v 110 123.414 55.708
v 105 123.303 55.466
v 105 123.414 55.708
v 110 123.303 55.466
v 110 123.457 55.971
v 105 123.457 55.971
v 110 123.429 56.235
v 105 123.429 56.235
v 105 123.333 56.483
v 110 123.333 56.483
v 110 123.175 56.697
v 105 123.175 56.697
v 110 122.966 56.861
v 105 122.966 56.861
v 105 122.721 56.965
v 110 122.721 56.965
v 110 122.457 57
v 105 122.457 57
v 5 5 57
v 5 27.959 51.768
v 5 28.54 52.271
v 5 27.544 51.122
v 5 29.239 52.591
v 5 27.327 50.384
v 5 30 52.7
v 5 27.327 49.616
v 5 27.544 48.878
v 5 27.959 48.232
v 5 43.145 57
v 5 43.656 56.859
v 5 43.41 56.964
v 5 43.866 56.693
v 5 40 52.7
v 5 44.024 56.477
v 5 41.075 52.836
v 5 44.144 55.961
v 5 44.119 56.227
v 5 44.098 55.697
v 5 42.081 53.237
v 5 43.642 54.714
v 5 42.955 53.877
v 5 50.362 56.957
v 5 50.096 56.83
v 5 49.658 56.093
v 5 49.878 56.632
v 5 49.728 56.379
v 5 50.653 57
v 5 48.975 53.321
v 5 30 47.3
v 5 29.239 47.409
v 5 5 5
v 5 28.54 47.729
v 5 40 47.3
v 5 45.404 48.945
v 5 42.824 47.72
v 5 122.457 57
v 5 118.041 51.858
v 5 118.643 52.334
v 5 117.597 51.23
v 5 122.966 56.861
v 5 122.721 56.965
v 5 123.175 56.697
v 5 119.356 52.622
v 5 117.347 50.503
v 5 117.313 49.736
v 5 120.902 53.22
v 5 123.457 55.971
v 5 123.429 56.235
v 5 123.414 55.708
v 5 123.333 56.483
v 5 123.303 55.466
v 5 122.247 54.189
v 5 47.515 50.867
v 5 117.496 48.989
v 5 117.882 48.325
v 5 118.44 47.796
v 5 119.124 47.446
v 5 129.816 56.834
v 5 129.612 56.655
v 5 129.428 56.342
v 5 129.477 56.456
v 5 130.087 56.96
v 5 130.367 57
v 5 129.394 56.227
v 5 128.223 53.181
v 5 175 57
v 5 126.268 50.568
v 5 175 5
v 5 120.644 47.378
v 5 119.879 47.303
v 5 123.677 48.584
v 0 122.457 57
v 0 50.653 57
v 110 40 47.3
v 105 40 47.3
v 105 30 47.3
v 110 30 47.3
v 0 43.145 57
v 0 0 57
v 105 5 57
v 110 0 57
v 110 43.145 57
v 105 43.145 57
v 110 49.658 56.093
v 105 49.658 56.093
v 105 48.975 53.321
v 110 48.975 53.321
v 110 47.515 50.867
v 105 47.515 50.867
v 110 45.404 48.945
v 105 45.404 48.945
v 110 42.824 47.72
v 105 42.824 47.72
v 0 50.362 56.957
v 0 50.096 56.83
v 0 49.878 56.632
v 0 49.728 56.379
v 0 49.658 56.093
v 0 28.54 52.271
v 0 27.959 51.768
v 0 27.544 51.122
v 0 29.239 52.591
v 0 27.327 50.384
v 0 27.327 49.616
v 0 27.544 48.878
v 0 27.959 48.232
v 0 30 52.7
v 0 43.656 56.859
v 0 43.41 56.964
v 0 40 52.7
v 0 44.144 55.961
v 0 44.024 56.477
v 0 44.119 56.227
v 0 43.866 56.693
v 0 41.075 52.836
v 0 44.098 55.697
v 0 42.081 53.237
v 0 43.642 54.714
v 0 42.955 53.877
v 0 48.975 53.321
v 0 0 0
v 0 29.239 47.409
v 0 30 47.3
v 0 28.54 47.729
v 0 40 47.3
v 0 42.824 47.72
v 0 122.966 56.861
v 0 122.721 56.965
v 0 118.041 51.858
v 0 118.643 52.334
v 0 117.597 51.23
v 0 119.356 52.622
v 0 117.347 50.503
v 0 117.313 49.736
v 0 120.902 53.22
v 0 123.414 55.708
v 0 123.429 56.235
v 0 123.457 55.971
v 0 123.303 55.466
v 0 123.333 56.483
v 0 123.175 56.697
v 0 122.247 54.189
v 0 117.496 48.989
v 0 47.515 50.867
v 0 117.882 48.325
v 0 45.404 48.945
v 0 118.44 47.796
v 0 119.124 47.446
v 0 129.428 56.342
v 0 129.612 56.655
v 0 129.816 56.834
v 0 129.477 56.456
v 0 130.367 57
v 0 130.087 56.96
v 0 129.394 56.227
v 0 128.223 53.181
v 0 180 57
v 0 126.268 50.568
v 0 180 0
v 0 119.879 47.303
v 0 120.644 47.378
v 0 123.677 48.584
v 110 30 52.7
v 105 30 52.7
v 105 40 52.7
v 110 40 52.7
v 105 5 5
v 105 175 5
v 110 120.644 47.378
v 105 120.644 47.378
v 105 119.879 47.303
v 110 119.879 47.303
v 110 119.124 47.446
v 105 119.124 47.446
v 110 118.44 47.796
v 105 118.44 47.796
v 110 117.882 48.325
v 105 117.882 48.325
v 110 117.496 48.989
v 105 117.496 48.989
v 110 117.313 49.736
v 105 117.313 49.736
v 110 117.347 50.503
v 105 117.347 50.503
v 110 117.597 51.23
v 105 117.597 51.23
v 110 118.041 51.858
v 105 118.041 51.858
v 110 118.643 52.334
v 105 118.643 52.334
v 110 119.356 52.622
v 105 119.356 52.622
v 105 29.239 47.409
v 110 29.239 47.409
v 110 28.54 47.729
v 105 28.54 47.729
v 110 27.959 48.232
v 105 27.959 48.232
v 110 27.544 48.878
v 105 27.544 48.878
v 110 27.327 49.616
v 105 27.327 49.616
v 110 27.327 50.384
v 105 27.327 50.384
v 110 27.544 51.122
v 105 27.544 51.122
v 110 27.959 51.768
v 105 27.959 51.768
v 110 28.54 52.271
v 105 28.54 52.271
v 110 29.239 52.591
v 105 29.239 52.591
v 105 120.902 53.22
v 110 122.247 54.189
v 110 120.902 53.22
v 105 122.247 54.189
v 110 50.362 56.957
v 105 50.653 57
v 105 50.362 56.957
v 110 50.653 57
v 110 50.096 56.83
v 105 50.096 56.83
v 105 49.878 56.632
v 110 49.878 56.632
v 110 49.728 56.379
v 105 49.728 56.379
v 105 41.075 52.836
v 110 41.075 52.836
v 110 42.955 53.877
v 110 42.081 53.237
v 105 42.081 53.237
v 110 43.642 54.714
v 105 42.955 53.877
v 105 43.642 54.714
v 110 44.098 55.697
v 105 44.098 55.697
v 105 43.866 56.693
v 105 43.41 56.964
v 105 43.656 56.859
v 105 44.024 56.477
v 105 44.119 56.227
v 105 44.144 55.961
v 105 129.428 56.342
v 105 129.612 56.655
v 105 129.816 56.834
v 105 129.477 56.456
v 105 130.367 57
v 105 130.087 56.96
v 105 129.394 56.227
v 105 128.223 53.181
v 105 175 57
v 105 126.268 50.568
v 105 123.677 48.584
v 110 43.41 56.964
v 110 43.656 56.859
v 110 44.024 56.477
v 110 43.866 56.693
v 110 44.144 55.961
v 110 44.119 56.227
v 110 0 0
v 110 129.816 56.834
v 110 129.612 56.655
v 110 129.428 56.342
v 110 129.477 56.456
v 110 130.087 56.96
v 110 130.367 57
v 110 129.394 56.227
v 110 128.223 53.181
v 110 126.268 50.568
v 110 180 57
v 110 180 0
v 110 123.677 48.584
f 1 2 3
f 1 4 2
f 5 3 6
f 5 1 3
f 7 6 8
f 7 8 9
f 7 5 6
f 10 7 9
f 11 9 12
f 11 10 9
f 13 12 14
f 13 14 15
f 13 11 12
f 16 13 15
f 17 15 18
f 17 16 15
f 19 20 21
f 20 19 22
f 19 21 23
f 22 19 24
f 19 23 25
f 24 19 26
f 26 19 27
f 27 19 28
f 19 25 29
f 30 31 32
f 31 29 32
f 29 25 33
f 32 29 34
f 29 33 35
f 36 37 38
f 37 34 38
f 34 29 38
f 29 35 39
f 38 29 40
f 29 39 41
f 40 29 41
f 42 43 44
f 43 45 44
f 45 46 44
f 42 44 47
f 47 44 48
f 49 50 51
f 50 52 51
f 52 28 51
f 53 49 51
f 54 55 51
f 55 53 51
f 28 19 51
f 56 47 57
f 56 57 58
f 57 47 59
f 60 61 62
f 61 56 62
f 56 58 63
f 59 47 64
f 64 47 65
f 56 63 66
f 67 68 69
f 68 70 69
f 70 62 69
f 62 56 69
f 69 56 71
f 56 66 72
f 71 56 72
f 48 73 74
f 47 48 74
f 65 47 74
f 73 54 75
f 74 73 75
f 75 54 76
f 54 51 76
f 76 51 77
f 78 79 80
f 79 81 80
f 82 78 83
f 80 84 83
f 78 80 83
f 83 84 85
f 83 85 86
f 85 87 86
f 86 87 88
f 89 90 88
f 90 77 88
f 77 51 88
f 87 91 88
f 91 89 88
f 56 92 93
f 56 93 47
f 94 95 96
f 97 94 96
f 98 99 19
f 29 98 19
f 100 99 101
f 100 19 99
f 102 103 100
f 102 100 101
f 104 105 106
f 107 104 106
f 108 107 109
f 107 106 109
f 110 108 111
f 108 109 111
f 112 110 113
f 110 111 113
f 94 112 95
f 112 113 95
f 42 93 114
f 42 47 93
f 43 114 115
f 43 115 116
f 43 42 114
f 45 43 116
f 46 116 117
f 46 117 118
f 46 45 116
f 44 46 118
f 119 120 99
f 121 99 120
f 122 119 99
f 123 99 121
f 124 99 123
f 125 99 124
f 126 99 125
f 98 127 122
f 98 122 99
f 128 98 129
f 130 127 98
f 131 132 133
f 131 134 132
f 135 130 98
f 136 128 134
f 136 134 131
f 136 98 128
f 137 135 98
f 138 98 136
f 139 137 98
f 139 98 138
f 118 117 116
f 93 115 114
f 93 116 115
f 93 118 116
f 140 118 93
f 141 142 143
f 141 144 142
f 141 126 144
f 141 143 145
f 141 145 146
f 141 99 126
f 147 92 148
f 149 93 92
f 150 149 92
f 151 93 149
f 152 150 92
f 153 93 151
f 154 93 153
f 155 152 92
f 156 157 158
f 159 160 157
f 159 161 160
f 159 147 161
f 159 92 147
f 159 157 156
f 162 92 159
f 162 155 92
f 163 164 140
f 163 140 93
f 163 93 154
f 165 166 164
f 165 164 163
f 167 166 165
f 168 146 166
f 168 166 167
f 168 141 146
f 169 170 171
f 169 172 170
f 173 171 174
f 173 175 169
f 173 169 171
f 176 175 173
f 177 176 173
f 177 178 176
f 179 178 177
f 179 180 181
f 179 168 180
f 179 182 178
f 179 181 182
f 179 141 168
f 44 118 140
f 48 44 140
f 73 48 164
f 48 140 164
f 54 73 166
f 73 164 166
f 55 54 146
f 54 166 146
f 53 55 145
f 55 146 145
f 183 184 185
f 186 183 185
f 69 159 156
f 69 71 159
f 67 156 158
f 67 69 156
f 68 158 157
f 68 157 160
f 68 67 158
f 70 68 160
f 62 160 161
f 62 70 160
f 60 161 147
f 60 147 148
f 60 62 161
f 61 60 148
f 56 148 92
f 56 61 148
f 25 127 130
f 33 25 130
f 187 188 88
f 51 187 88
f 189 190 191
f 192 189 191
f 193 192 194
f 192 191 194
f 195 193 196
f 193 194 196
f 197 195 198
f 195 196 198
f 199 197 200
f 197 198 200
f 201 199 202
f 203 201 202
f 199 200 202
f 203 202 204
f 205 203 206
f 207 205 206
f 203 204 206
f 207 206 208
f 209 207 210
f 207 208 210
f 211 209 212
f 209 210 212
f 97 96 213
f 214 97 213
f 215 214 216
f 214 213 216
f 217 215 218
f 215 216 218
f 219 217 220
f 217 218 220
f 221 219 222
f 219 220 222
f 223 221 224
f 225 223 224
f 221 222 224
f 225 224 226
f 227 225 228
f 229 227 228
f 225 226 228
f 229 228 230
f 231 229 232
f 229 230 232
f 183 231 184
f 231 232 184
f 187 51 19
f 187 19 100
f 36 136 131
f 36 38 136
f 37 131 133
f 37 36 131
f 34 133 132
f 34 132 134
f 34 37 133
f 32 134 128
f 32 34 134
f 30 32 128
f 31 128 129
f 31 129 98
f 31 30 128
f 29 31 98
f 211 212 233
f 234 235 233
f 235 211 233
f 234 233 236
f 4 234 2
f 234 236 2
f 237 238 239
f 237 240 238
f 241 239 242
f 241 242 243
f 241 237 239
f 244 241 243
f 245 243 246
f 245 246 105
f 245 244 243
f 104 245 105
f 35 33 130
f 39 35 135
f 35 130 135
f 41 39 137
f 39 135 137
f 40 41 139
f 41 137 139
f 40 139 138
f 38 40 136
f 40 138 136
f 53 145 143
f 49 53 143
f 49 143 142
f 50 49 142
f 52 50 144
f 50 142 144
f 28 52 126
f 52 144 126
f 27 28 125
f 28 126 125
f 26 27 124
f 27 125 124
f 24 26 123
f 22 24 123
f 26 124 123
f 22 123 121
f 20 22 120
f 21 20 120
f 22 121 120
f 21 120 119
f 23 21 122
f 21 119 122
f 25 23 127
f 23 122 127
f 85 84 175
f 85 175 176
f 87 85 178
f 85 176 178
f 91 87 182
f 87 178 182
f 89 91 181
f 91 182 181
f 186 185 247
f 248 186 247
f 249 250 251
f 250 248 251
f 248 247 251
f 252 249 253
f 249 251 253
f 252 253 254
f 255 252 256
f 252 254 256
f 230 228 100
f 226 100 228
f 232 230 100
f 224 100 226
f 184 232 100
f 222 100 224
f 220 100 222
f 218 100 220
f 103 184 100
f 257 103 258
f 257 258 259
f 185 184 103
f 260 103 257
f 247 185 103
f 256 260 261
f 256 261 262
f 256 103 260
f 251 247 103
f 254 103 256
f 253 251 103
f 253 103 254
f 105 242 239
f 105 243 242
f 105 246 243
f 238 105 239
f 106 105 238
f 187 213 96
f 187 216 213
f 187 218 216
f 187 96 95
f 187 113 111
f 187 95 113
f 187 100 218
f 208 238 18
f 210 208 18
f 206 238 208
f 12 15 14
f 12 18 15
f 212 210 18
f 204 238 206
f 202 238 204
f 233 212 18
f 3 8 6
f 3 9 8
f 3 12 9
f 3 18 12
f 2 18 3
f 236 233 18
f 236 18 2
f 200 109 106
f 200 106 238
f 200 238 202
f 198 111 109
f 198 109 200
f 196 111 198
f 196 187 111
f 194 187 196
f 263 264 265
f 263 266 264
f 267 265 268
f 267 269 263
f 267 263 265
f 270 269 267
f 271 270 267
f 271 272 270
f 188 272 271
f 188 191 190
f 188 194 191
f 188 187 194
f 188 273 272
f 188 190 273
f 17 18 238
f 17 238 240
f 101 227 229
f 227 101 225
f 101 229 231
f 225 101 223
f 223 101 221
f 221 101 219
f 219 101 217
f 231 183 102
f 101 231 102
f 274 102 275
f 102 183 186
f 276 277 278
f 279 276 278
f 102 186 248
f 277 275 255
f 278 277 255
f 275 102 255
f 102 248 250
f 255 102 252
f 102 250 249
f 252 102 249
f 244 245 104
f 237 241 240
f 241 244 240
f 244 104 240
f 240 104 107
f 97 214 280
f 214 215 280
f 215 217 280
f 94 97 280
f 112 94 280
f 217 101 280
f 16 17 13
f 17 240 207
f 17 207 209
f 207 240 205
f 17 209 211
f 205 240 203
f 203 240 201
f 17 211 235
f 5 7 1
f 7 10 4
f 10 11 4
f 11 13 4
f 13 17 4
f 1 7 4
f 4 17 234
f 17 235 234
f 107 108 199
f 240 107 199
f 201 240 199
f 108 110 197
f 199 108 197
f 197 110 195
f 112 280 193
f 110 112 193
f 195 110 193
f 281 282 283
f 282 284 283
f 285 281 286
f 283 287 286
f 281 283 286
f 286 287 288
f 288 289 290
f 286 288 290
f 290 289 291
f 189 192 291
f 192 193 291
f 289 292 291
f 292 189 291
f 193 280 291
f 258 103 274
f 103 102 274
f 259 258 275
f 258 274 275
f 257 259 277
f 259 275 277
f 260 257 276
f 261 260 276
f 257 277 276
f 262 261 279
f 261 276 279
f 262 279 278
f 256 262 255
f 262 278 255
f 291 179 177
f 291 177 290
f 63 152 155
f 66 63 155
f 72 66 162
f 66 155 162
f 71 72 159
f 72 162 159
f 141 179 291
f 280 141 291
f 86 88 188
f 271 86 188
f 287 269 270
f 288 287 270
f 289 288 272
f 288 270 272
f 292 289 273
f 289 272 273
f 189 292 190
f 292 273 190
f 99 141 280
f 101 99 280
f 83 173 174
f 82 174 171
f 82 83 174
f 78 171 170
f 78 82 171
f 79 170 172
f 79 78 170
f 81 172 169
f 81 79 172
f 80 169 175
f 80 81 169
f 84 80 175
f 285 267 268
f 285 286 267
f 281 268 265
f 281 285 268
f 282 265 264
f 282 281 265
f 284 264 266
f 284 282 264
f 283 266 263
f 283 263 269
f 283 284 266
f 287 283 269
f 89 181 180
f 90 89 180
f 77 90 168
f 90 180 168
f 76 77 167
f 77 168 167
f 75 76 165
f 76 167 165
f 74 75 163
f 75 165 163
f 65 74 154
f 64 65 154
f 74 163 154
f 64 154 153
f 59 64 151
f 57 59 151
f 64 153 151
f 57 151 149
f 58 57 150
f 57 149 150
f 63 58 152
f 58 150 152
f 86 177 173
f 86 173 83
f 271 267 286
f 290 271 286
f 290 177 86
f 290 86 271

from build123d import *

# Parameters (mm, degrees)
ESQUISSE1_W             = 110
ESQUISSE1_H             = 180
ESQUISSE1_W_2           = 100
ESQUISSE1_H_2           = 170
BOSS_EXTRU_1_DEPTH      = 57
ESQUISSE2_W             = 110
ESQUISSE2_H             = 180
BOSS_EXTRU_2_DEPTH      = 5
ENL_V_MAT_EXTRU_1_DEPTH = 111
CONG_1_R                = 1


with BuildPart() as part:
    # Esquisse1 → Boss.-Extru.1 (new body)
    with BuildSketch(Plane.XY):
        with Locations((55, 90)):
            Rectangle(ESQUISSE1_W, ESQUISSE1_H)
        with Locations((55, 90)):
            Rectangle(ESQUISSE1_W_2, ESQUISSE1_H_2, mode=Mode.SUBTRACT)
    extrude(amount=BOSS_EXTRU_1_DEPTH)

    # Esquisse2 → Boss.-Extru.2 (add)
    with BuildSketch(Plane(origin=(0, 0, 0), x_dir=(-1, 0, 0), z_dir=(0, 0, -1))):
        with Locations((-55, 90)):
            Rectangle(ESQUISSE2_W, ESQUISSE2_H)
    extrude(amount=-BOSS_EXTRU_2_DEPTH)

    # Esquisse3 → Enlèv. mat.-Extru.1 (cut, through all)
    with BuildSketch(Plane.ZY):
        with BuildLine():
            ThreePointArc((52.62207614, 119.356014971), (54.199469032, 122.258730766), (57, 124.011144421))
            Line((57, 124.011144421), (57, 129.5))
            ThreePointArc((57, 129.5), (56.714535858, 129.484866891), (56.432271686, 129.439637203))
            ThreePointArc((56.432271686, 129.439637203), (50.642732019, 126.341305275), (47.37792386, 120.643985029))
            ThreePointArc((47.37792386, 120.643985029), (49.356014971, 117.37792386), (52.62207614, 119.356014971))
        make_face()
        with BuildLine():
            Line((57, 129.5), (57, 124.011144421))
            ThreePointArc((57, 124.011144421), (57.282178821, 124.092165775), (57.567728314, 124.160362797))
            ThreePointArc((57.567728314, 124.160362797), (59.684866891, 127.085464142), (57, 129.5))
        make_face()
        with BuildLine():
            ThreePointArc((47.3, 40), (50, 42.7), (52.7, 40))
            ThreePointArc((52.7, 40), (53.959440841, 43.040559159), (57, 44.3))
            Line((57, 44.3), (57, 49.7))
            ThreePointArc((57, 49.7), (50.141064222, 46.858935778), (47.3, 40))
        make_face()
        with BuildLine():
            Line((57, 49.7), (57, 44.3))
            ThreePointArc((57, 44.3), (59.7, 47), (57, 49.7))
        make_face()
        with BuildLine():
            ThreePointArc((47.3, 40), (50, 37.3), (52.7, 40))
            ThreePointArc((52.7, 40), (50, 42.7), (47.3, 40))
        make_face()
        with BuildLine():
            Line((47.3, 40), (47.3, 30))
            ThreePointArc((47.3, 30), (50, 27.3), (52.7, 30))
            Line((52.7, 30), (52.7, 40))
            ThreePointArc((52.7, 40), (50, 37.3), (47.3, 40))
        make_face()
    extrude(amount=-ENL_V_MAT_EXTRU_1_DEPTH, mode=Mode.SUBTRACT)

    # Congé1
    cong_1_edges = [part.edges().sort_by_distance(p)[0] for p in [
        (2.5, 49.7, 57),
        (107.5, 49.7, 57),
        (107.5, 44.3, 57),
        (2.5, 44.3, 57),
        (2.5, 124.011144421, 57),
        (2.5, 129.5, 57),
        (107.5, 124.011144421, 57),
        (107.5, 129.5, 57),
    ]]
    fillet(cong_1_edges, radius=CONG_1_R)


solid = part.part
